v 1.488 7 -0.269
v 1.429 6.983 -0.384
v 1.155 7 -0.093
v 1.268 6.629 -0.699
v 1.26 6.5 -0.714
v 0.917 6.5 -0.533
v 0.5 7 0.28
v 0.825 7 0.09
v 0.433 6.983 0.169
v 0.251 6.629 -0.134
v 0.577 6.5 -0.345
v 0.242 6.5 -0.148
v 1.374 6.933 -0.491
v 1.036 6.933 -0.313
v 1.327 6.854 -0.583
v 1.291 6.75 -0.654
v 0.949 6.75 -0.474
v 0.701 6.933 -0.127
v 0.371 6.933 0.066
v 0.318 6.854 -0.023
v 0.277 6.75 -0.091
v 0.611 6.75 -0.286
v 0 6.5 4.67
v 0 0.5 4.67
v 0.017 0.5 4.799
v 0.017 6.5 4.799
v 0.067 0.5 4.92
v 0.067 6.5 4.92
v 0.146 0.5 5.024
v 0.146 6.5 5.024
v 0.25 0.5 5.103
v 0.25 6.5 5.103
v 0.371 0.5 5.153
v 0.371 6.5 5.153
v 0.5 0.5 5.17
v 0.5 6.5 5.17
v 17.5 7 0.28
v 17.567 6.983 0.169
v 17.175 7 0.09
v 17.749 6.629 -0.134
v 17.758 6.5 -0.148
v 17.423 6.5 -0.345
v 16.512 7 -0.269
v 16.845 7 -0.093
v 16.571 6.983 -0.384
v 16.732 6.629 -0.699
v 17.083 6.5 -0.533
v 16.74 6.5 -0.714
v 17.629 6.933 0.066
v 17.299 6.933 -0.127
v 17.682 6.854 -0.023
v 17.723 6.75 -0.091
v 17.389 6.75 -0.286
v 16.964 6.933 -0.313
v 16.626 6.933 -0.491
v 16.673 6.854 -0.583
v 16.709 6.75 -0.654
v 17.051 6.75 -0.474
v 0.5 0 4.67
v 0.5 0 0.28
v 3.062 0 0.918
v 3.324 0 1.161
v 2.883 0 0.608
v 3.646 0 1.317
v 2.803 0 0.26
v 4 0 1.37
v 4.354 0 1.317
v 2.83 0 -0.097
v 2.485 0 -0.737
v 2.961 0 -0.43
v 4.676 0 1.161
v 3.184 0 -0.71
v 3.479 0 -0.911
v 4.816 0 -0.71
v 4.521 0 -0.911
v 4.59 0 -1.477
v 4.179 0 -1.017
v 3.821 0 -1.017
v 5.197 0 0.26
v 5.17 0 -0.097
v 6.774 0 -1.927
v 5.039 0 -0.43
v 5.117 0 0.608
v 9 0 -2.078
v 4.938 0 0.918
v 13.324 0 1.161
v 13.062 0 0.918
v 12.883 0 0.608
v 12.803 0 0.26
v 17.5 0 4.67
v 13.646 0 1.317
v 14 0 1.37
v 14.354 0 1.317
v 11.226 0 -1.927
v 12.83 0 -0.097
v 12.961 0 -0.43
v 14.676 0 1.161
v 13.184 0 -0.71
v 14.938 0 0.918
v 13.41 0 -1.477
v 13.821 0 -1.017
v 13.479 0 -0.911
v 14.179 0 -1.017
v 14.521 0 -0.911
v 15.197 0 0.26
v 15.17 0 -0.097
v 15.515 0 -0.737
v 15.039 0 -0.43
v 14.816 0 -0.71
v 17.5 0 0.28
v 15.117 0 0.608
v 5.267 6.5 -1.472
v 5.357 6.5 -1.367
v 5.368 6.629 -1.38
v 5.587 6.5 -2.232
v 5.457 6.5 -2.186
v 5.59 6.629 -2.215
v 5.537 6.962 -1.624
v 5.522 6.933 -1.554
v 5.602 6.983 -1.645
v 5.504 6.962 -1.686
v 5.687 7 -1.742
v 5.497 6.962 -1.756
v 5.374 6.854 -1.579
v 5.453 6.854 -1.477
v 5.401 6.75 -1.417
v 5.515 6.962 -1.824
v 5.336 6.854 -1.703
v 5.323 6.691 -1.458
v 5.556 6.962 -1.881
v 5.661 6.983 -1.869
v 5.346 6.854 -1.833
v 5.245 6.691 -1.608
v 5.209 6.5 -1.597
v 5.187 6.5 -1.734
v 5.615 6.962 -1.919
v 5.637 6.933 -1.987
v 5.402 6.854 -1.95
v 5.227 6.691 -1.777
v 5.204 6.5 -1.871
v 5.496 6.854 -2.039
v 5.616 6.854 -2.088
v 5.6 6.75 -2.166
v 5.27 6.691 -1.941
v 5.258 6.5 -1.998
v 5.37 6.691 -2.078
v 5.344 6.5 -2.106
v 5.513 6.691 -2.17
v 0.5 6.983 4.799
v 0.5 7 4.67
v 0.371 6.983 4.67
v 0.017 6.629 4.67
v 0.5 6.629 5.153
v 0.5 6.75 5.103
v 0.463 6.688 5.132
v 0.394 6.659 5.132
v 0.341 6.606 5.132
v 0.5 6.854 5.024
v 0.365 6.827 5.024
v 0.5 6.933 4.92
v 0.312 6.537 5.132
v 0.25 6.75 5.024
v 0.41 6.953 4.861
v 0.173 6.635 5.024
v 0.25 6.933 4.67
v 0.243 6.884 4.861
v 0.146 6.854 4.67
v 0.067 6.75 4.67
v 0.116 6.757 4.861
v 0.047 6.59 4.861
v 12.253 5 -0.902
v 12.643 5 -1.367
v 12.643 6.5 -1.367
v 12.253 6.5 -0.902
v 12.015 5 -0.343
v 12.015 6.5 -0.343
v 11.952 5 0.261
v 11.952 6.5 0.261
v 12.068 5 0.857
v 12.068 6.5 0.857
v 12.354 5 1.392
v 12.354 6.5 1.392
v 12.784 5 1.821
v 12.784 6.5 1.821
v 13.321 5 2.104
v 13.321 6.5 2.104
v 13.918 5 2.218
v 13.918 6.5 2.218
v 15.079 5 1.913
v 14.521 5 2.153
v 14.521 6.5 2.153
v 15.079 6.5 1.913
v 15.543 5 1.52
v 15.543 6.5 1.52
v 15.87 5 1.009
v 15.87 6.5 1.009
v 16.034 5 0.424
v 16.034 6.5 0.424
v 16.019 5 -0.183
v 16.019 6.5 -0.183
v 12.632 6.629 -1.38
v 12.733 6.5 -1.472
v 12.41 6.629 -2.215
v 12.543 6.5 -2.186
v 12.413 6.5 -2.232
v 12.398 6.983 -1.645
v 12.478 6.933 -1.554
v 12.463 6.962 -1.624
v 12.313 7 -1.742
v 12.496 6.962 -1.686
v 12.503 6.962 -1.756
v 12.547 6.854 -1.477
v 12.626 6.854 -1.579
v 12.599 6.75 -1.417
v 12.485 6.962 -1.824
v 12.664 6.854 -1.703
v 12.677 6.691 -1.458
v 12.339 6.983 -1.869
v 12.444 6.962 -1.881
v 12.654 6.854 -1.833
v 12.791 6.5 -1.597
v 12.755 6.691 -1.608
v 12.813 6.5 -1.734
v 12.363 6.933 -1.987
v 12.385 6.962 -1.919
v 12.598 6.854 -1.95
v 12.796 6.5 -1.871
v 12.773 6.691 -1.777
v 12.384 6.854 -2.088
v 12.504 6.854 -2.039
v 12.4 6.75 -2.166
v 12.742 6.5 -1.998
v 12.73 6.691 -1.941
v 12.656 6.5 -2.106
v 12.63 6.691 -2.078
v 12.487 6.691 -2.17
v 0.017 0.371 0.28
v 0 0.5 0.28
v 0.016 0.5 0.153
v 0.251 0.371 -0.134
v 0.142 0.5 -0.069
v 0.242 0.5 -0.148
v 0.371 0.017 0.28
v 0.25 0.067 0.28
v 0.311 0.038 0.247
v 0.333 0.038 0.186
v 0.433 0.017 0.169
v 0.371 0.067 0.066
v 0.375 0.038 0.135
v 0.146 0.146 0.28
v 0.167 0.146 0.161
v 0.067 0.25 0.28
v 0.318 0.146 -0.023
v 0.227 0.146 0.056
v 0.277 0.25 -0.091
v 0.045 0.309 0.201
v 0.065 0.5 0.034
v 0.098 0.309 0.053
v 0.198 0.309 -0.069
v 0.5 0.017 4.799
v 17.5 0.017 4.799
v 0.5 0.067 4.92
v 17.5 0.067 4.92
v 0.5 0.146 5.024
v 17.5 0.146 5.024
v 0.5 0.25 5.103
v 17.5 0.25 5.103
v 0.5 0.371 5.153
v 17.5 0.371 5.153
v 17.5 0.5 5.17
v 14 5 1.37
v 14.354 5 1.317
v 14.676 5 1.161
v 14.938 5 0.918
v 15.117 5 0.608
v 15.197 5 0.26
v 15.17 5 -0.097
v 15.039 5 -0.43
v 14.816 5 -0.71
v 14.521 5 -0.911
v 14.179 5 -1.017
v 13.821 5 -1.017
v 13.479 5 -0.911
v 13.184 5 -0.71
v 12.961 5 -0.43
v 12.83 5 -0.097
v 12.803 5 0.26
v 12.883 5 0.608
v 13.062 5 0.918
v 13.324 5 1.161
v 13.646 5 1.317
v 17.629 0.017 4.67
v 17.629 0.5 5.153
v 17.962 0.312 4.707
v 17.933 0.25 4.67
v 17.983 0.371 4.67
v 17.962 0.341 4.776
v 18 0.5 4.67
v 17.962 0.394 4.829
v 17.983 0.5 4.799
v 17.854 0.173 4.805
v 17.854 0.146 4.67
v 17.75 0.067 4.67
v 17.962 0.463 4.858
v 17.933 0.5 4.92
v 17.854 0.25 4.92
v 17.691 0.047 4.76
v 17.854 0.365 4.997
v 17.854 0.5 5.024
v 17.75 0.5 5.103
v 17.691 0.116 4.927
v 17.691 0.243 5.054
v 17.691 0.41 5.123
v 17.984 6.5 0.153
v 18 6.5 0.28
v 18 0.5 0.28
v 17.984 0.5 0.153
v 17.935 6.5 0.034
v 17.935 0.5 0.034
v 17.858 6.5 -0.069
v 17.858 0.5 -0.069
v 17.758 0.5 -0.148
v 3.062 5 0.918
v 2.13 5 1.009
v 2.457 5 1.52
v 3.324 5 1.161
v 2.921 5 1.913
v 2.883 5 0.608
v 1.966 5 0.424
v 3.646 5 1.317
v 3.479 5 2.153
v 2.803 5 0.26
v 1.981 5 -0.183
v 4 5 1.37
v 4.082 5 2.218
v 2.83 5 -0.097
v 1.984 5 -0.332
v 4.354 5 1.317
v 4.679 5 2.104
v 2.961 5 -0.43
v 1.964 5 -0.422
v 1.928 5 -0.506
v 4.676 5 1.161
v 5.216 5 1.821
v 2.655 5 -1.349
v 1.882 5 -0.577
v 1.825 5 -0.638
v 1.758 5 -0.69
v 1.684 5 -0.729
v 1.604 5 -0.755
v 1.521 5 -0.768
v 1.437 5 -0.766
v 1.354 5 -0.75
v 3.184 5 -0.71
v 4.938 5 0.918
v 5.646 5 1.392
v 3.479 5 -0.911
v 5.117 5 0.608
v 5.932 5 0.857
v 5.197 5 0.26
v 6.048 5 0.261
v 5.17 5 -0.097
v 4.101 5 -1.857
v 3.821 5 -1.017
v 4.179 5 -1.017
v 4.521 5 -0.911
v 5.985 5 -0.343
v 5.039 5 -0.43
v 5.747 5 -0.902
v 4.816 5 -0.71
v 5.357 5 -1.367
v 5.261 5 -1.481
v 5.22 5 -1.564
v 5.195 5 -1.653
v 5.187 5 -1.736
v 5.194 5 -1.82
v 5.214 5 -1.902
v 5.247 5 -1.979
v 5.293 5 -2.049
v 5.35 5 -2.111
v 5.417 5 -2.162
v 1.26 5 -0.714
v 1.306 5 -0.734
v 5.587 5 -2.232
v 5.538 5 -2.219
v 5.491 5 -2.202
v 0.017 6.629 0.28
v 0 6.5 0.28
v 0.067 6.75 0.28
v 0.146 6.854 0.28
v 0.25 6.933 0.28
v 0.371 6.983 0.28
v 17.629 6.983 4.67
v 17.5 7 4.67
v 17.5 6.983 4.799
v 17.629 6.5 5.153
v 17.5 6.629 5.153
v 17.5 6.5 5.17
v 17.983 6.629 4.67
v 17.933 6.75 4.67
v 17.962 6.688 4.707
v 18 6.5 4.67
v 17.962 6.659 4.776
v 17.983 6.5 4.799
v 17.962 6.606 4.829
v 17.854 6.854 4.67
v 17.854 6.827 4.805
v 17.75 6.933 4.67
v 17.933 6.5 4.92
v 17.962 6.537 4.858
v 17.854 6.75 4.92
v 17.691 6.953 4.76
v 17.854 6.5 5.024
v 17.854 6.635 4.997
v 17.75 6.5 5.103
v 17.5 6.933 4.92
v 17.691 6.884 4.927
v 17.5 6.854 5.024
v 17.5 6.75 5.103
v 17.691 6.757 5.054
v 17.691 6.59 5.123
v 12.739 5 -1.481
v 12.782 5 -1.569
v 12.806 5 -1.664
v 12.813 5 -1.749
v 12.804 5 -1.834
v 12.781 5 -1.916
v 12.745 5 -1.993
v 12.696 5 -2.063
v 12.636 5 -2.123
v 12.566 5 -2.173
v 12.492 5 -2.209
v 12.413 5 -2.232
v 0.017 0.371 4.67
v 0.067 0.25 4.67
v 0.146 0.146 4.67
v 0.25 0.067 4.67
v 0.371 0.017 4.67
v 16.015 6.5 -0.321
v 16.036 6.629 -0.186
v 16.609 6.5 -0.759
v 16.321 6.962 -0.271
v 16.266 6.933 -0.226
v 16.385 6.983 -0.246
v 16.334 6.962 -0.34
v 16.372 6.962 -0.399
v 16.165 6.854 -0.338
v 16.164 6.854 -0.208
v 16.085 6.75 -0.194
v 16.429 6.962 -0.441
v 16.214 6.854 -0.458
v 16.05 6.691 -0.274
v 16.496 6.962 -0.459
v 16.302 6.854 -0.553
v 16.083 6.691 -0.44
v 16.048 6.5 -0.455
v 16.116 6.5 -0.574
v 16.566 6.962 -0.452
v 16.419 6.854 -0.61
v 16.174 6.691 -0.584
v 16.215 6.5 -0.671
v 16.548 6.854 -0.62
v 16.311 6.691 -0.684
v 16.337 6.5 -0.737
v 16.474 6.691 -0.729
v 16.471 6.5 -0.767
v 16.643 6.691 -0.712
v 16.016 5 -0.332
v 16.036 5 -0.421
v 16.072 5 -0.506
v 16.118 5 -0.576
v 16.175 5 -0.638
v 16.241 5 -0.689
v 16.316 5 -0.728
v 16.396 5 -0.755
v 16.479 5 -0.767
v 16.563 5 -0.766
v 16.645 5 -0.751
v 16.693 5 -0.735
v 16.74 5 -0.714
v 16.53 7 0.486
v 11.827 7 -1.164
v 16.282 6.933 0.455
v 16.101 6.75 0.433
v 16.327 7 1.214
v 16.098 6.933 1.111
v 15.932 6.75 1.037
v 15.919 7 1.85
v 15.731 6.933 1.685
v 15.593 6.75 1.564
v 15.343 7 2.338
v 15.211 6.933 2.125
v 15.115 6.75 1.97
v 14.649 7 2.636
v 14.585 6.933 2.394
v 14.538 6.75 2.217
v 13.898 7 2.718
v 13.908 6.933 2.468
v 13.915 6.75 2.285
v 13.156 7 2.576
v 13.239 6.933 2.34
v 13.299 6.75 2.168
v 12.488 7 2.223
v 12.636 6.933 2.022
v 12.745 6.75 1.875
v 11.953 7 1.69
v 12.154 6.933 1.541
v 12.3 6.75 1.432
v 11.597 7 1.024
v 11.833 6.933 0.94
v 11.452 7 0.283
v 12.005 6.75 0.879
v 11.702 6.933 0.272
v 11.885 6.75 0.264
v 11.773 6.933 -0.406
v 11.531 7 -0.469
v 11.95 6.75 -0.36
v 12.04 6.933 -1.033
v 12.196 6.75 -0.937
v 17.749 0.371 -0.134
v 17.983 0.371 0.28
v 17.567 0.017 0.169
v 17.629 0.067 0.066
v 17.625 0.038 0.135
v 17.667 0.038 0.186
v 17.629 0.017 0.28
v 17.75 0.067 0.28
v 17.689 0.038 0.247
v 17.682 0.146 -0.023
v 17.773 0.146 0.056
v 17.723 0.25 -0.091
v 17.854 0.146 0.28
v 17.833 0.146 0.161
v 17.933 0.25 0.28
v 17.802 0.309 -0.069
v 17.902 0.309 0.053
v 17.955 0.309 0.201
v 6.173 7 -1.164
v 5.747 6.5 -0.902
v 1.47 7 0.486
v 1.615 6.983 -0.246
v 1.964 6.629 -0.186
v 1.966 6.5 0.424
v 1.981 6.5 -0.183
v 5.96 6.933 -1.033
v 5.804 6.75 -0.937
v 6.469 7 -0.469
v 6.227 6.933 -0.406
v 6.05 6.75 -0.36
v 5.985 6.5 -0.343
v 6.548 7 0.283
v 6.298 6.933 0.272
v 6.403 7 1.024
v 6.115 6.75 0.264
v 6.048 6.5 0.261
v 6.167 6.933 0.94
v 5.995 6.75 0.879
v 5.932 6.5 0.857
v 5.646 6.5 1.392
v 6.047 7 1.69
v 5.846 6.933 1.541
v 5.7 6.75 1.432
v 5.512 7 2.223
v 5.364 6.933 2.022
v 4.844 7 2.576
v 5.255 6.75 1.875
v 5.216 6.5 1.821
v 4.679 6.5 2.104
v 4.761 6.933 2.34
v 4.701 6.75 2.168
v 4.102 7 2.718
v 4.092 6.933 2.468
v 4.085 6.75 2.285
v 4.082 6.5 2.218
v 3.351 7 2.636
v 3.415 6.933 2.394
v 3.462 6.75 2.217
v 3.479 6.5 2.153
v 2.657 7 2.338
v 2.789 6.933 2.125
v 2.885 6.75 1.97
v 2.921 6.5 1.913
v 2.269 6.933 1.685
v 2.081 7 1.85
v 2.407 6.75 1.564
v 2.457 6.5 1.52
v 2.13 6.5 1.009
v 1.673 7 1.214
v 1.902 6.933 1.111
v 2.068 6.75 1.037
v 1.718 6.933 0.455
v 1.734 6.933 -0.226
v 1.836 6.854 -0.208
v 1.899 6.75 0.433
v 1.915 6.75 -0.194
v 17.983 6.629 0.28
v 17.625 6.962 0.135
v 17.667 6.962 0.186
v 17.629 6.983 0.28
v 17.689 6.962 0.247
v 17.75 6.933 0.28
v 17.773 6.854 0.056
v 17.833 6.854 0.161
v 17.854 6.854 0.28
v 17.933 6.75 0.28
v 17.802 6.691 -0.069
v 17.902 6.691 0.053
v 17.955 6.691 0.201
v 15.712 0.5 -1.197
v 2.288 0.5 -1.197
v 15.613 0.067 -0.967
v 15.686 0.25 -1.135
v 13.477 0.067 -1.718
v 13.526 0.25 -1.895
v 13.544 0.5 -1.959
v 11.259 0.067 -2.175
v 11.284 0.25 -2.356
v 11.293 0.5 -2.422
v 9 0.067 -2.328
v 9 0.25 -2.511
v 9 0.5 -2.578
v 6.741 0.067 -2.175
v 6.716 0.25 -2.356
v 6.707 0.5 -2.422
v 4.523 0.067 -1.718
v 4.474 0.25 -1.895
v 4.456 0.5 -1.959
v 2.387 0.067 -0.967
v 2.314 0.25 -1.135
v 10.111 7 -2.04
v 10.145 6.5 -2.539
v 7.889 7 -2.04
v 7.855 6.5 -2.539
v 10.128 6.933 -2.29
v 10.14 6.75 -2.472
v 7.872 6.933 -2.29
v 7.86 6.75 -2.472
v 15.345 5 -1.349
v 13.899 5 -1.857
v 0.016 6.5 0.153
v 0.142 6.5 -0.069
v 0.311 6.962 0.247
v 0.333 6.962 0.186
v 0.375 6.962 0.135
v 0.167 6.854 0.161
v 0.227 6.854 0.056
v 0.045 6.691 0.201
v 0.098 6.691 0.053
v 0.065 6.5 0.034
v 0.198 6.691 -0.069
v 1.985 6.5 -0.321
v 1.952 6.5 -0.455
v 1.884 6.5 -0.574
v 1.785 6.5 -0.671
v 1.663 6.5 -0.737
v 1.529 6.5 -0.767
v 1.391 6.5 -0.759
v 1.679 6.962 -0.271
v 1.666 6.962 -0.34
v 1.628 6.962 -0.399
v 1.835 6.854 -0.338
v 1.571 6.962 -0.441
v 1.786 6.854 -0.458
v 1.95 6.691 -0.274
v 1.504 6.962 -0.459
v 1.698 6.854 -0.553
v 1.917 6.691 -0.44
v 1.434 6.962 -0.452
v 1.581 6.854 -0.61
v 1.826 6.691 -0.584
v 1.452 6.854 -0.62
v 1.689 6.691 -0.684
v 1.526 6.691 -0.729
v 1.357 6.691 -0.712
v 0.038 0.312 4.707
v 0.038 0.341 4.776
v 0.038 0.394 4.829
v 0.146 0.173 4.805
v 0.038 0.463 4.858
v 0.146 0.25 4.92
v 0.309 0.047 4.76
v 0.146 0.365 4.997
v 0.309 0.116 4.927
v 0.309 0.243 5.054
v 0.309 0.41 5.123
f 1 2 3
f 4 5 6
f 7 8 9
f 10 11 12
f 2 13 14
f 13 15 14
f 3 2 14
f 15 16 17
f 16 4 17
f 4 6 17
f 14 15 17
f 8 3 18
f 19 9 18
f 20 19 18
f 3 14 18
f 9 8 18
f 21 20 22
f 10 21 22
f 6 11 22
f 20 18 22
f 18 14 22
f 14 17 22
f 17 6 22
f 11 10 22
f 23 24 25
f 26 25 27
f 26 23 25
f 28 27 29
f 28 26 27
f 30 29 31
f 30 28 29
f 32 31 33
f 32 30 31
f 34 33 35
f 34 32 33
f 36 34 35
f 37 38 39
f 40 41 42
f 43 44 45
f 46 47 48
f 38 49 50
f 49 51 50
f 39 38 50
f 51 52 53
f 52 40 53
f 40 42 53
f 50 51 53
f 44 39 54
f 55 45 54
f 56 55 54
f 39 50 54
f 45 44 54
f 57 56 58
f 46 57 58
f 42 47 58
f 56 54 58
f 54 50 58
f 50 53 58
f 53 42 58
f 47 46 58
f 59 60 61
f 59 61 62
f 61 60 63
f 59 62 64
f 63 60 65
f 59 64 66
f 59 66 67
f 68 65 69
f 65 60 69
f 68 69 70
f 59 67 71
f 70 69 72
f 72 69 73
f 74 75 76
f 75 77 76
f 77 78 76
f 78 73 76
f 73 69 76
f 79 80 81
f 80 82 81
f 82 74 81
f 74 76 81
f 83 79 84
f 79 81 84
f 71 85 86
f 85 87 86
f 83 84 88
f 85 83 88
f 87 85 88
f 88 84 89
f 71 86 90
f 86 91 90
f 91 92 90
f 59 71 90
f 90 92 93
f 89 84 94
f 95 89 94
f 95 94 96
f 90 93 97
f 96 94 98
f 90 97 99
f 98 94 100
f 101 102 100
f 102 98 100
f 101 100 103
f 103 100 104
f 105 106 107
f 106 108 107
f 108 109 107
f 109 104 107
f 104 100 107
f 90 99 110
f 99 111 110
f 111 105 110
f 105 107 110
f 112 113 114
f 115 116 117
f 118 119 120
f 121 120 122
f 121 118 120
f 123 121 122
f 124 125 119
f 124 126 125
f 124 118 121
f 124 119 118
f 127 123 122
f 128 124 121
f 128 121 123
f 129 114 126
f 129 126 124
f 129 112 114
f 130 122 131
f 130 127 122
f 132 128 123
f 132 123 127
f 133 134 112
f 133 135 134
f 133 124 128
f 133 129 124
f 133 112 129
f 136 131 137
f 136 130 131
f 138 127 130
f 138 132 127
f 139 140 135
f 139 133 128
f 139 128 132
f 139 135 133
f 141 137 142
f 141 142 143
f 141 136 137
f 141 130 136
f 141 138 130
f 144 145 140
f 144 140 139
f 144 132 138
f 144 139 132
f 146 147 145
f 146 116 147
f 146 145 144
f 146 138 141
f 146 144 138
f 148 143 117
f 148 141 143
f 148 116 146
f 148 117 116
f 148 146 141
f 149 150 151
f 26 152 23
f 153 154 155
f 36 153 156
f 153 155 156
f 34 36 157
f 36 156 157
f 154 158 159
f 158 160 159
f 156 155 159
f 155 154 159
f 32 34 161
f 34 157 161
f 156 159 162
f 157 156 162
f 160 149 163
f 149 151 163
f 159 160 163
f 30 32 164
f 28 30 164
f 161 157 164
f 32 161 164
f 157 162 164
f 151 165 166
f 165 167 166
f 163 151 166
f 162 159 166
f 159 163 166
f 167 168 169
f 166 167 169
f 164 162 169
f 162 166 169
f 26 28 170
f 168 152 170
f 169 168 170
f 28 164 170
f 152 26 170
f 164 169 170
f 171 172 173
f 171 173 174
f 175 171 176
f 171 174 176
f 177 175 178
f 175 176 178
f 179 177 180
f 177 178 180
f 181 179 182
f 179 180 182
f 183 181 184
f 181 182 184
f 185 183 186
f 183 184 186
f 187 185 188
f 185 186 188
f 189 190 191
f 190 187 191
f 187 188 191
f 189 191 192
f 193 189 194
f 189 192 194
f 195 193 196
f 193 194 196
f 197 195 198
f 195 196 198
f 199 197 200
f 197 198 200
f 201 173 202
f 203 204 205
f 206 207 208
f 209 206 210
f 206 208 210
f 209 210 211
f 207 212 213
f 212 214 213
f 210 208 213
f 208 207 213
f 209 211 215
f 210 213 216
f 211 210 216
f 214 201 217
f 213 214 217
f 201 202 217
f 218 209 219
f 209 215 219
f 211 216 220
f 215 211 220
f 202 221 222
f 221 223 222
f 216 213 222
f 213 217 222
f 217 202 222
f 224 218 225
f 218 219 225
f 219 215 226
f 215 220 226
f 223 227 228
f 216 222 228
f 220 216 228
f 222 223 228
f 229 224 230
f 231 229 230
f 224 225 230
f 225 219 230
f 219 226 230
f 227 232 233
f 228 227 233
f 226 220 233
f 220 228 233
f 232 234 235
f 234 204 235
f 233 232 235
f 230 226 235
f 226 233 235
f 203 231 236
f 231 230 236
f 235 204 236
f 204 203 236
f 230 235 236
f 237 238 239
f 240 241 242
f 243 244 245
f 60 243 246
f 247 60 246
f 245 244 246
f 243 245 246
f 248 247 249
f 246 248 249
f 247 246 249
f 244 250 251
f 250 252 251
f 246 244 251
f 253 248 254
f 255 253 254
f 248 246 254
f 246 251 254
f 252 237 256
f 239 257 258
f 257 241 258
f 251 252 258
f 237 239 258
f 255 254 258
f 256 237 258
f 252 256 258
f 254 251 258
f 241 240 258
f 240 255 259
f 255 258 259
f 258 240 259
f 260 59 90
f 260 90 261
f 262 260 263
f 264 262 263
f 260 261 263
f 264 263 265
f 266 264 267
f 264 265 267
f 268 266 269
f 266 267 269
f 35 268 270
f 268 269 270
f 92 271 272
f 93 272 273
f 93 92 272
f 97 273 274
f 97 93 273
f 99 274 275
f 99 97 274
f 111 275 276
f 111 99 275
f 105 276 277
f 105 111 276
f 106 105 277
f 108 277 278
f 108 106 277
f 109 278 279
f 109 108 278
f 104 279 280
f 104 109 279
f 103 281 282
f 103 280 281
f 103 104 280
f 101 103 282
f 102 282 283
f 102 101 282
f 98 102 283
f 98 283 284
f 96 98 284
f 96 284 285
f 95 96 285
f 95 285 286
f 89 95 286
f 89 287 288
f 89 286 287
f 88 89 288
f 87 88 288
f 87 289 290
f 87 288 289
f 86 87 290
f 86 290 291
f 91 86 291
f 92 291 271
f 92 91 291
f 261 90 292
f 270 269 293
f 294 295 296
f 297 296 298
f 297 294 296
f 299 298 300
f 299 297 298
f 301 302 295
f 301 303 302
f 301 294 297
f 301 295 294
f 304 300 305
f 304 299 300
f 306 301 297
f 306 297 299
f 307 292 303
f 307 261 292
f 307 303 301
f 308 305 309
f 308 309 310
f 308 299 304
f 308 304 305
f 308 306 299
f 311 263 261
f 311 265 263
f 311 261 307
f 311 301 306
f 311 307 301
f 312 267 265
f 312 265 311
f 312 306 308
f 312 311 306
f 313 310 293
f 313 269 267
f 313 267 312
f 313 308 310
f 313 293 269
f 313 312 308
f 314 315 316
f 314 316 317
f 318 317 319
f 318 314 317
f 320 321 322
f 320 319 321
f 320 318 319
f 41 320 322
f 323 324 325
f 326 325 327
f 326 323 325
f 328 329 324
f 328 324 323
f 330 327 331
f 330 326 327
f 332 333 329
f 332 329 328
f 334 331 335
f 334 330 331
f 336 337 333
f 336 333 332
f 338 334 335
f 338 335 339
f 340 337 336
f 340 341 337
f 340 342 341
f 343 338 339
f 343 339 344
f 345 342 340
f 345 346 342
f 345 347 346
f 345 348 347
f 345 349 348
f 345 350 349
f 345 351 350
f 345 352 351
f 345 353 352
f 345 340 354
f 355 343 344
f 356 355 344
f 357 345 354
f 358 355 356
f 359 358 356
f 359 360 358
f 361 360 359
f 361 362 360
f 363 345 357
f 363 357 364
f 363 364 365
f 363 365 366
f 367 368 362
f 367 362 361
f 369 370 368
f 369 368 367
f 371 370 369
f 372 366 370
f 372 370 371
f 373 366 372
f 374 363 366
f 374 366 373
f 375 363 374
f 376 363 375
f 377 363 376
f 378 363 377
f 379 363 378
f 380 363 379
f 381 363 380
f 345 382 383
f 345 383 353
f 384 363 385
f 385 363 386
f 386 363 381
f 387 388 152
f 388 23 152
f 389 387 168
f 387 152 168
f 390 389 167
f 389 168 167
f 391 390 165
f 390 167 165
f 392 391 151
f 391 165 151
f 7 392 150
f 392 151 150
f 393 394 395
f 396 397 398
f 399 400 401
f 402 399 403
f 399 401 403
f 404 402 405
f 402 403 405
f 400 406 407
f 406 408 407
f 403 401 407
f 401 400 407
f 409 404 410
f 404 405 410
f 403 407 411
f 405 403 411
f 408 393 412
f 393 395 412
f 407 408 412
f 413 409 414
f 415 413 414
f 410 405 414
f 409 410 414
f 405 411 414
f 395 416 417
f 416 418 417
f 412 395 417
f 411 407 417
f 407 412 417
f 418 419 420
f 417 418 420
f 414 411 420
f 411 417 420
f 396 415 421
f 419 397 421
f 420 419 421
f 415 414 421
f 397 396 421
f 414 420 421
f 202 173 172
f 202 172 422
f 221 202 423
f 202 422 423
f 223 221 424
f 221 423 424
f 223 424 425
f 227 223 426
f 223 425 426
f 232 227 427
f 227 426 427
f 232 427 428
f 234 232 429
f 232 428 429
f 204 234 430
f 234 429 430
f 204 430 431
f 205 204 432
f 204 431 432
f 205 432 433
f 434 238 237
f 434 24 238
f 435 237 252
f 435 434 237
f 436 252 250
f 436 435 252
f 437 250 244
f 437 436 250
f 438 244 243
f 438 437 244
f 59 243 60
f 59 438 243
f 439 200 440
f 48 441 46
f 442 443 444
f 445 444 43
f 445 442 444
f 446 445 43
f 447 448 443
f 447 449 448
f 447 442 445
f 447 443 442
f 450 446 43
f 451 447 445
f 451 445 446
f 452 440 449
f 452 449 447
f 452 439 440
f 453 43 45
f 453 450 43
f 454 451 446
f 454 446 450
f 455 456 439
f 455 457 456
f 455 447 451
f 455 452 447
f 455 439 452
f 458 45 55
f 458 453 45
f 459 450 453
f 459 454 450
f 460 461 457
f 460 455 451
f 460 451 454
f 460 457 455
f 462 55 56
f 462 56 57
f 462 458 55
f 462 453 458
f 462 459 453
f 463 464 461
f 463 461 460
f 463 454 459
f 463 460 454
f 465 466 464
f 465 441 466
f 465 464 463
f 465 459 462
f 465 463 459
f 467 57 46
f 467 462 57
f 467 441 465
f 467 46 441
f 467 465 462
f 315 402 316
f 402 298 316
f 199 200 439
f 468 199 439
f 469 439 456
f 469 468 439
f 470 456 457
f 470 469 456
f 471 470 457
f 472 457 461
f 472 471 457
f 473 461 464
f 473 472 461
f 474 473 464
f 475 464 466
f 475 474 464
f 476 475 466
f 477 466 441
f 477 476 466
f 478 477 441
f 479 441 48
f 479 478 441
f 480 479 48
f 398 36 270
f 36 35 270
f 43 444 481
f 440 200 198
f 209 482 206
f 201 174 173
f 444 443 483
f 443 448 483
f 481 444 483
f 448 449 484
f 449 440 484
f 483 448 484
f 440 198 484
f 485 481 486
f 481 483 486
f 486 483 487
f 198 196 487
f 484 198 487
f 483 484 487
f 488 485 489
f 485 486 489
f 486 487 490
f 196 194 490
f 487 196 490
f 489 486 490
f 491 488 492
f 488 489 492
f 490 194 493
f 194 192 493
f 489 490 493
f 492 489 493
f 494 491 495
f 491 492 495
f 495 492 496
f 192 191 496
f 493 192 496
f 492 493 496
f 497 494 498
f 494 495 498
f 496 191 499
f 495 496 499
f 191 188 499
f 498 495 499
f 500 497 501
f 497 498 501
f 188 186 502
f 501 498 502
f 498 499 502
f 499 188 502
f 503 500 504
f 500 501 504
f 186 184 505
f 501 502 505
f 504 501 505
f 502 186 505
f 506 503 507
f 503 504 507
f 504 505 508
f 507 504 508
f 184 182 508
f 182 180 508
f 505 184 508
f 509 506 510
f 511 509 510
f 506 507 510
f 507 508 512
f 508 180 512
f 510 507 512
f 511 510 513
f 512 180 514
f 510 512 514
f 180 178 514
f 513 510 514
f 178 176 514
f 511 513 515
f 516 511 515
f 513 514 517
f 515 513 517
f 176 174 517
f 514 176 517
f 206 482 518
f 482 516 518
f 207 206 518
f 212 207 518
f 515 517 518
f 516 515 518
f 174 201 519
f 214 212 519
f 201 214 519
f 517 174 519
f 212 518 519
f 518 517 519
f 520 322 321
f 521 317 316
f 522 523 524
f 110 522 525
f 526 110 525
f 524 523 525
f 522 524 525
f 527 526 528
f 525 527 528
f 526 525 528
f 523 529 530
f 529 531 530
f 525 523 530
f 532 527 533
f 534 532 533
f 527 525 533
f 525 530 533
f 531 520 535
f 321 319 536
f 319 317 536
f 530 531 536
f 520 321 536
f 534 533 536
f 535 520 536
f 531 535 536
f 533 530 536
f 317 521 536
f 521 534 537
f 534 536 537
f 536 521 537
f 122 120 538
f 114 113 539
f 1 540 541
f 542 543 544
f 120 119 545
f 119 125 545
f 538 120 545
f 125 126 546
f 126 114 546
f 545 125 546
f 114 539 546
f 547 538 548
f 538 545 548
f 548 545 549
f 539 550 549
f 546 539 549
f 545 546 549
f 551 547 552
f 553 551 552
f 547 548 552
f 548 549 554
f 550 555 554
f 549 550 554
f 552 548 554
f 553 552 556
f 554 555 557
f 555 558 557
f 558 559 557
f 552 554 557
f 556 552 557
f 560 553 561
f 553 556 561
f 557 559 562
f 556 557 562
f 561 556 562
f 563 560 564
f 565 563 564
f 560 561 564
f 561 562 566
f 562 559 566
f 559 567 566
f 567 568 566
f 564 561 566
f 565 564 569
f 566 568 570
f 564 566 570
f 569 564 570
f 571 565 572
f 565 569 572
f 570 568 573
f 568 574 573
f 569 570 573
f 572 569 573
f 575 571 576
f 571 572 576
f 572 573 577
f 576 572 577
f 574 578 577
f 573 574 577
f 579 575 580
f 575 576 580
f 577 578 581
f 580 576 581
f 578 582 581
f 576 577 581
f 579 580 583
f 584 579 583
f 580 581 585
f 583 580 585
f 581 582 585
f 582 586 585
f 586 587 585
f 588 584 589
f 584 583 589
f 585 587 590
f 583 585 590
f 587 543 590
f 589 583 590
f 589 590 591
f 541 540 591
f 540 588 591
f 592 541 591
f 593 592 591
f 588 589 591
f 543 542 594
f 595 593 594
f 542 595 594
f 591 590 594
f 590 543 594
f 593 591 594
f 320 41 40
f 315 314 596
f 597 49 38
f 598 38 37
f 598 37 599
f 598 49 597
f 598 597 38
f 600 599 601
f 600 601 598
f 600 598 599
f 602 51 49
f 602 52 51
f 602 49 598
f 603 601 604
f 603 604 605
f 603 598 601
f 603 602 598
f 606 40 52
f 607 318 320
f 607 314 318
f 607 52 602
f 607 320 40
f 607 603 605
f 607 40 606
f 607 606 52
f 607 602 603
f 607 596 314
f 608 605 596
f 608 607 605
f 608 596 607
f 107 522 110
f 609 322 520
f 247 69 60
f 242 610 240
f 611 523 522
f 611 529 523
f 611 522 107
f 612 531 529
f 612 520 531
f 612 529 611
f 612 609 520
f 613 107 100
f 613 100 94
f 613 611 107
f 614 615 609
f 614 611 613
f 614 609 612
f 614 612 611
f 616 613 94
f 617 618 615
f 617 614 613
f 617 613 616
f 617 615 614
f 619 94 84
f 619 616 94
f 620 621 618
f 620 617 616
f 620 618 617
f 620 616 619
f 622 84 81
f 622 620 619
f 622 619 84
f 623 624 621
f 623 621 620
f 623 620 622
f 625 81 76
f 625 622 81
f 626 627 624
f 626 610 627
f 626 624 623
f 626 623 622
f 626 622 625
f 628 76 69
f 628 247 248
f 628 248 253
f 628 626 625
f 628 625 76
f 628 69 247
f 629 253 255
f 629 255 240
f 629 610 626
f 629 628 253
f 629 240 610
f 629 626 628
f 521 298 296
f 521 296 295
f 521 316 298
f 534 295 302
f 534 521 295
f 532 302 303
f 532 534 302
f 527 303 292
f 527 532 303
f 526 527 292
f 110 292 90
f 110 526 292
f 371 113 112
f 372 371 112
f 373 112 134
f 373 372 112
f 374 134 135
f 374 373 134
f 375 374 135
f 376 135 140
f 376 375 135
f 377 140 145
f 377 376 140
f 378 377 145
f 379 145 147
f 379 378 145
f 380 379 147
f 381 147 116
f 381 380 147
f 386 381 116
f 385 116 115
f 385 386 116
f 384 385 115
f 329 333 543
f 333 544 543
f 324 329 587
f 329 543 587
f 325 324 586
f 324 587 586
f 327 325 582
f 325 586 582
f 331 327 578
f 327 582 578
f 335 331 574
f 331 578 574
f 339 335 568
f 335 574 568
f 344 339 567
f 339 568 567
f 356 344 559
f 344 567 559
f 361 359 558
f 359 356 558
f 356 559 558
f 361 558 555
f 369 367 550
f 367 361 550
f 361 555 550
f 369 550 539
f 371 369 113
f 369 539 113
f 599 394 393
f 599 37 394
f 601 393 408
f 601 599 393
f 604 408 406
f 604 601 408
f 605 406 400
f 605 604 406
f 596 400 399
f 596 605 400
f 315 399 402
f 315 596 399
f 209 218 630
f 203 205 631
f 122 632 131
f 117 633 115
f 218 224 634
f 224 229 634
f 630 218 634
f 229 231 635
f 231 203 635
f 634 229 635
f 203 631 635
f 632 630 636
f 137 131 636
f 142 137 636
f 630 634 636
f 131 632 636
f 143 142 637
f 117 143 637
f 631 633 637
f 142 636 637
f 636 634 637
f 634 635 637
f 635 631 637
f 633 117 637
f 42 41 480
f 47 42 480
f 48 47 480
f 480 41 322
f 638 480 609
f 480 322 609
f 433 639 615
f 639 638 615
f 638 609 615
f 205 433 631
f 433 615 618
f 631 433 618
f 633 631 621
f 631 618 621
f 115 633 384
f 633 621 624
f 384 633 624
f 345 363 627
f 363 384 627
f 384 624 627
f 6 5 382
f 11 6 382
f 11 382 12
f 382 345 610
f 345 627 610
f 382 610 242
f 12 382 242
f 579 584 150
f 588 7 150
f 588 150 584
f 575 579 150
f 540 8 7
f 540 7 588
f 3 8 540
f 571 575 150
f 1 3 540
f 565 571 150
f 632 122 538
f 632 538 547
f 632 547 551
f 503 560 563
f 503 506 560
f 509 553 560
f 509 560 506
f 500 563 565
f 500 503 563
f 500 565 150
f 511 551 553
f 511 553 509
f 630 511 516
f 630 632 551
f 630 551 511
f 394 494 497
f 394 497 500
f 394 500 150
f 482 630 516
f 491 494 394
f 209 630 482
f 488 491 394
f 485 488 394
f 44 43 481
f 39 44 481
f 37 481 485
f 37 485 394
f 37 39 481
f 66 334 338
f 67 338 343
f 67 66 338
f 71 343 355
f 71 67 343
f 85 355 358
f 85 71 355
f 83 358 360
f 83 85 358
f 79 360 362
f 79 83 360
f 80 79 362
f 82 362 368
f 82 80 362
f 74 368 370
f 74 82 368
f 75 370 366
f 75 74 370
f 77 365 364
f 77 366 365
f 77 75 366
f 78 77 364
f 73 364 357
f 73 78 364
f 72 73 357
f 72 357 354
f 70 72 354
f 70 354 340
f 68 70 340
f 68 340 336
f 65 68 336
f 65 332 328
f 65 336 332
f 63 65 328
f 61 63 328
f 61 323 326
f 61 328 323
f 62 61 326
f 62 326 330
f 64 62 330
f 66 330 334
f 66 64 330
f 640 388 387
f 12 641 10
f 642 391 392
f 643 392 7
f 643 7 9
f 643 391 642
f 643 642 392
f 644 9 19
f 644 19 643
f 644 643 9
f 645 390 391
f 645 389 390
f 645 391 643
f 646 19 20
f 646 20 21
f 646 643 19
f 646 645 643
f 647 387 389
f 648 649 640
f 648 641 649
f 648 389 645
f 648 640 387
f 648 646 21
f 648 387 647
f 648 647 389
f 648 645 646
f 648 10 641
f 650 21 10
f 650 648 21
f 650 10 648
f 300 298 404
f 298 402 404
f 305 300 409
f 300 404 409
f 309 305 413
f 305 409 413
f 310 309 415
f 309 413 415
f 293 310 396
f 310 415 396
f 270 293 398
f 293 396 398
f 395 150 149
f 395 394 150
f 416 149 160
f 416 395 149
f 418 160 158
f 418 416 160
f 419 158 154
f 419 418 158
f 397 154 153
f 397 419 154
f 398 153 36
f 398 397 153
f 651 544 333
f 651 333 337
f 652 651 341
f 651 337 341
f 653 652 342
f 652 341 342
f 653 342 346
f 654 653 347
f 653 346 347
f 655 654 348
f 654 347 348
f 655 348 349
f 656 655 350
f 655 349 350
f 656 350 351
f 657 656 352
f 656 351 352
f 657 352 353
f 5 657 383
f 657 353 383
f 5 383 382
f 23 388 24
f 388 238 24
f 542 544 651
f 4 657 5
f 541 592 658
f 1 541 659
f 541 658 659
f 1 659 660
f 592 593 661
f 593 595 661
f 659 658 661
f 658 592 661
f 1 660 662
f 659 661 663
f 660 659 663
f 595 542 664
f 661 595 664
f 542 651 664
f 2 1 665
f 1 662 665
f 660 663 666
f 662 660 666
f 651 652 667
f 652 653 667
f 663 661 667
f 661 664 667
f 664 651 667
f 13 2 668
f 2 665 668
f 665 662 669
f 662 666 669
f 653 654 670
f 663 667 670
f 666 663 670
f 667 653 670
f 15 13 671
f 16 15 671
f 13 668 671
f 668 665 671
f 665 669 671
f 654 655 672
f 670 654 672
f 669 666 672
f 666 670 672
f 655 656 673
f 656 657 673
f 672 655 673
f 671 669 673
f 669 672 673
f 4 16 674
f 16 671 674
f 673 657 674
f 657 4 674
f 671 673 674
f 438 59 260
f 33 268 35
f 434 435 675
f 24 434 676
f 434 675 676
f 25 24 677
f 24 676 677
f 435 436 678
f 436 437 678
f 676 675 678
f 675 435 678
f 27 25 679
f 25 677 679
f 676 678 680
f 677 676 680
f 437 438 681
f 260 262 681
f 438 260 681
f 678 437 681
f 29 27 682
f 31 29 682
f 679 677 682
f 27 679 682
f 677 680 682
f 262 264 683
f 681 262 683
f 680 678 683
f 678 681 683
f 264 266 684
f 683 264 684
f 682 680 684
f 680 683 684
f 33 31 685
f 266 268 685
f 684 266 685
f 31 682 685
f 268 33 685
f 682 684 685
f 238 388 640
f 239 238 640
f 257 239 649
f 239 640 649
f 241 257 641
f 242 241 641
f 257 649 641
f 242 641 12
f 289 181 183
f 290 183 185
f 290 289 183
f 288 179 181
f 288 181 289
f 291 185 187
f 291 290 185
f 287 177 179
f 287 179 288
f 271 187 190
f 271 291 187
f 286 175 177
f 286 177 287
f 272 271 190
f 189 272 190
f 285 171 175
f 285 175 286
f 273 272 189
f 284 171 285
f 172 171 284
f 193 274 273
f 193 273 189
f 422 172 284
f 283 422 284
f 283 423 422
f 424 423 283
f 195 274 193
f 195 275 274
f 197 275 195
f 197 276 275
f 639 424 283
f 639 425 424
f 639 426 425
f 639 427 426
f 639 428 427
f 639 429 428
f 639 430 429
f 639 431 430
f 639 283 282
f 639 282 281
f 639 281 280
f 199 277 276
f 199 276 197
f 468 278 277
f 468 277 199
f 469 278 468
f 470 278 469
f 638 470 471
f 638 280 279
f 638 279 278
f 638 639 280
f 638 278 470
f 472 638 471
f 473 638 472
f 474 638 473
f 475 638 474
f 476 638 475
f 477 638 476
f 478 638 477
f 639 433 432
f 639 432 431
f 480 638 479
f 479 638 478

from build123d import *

# Parameters (mm, degrees)
SKETCH1_R           = 1.2
BOSS_EXTRUDE1_DEPTH = 7
SKETCH2_R           = 2.05
CUT_EXTRUDE1_DEPTH  = 2
FILLET1_R           = 0.5


with BuildPart() as part:
    # Sketch1 → Boss-Extrude1 (new body)
    with BuildSketch(Plane(origin=(0, 0, 0), x_dir=(1, 0, 0), z_dir=(0, 1, 0))):
        with BuildLine():
            Line((0, 0), (0, -5.17))
            Line((0, -5.17), (18, -5.17))
            Line((18, -5.17), (18, 0))
            ThreePointArc((18, 0), (9, 2.577794898), (0, 0))
        make_face()
        with Locations(Location((4, -0.17, 0), (0, 0, 270))):
            Circle(SKETCH1_R, mode=Mode.SUBTRACT)
        with Locations(Location((14, -0.17, 0), (0, 0, 270))):
            Circle(SKETCH1_R, mode=Mode.SUBTRACT)
    extrude(amount=BOSS_EXTRUDE1_DEPTH)

    # Sketch2 → Cut-Extrude1 (cut)
    with BuildSketch(Plane(origin=(0, 7, 0), x_dir=(1, 0, 0), z_dir=(0, 1, 0))):
        with Locations((4, -0.17)):
            Circle(SKETCH2_R)
        with Locations((14, -0.17)):
            Circle(SKETCH2_R)
    extrude(amount=-CUT_EXTRUDE1_DEPTH, mode=Mode.SUBTRACT)

    # Fillet1
    fillet1_edges = [part.edges().sort_by_distance(p)[0] for p in [
        (0, 7, 2.585),
        (9, 7, 5.17),
        (9, 7, -2.577794898),
        (1.271083669, 7, -0.719256266),
        (13.841338508, 6, -1.873850907),
        (15.400788894, 6, -1.326759992),
        (2.599211106, 6, -1.326759992),
        (4.158661492, 6, -1.873850907),
        (4.678636308, 7, 2.104412769),
        (13.321363692, 7, 2.104412769),
        (18, 7, 2.585),
        (9, 0, 5.17),
        (0, 0, 2.585),
        (9, 0, -2.577794898),
        (18, 0, 2.585),
        (18, 3.5, 5.17),
        (0, 3.5, 5.17),
        (0, 3.5, 0),
        (18, 3.5, 0),
        (16.728916331, 7, -0.719256266),
    ]]
    fillet(fillet1_edges, radius=FILLET1_R)


solid = part.part
